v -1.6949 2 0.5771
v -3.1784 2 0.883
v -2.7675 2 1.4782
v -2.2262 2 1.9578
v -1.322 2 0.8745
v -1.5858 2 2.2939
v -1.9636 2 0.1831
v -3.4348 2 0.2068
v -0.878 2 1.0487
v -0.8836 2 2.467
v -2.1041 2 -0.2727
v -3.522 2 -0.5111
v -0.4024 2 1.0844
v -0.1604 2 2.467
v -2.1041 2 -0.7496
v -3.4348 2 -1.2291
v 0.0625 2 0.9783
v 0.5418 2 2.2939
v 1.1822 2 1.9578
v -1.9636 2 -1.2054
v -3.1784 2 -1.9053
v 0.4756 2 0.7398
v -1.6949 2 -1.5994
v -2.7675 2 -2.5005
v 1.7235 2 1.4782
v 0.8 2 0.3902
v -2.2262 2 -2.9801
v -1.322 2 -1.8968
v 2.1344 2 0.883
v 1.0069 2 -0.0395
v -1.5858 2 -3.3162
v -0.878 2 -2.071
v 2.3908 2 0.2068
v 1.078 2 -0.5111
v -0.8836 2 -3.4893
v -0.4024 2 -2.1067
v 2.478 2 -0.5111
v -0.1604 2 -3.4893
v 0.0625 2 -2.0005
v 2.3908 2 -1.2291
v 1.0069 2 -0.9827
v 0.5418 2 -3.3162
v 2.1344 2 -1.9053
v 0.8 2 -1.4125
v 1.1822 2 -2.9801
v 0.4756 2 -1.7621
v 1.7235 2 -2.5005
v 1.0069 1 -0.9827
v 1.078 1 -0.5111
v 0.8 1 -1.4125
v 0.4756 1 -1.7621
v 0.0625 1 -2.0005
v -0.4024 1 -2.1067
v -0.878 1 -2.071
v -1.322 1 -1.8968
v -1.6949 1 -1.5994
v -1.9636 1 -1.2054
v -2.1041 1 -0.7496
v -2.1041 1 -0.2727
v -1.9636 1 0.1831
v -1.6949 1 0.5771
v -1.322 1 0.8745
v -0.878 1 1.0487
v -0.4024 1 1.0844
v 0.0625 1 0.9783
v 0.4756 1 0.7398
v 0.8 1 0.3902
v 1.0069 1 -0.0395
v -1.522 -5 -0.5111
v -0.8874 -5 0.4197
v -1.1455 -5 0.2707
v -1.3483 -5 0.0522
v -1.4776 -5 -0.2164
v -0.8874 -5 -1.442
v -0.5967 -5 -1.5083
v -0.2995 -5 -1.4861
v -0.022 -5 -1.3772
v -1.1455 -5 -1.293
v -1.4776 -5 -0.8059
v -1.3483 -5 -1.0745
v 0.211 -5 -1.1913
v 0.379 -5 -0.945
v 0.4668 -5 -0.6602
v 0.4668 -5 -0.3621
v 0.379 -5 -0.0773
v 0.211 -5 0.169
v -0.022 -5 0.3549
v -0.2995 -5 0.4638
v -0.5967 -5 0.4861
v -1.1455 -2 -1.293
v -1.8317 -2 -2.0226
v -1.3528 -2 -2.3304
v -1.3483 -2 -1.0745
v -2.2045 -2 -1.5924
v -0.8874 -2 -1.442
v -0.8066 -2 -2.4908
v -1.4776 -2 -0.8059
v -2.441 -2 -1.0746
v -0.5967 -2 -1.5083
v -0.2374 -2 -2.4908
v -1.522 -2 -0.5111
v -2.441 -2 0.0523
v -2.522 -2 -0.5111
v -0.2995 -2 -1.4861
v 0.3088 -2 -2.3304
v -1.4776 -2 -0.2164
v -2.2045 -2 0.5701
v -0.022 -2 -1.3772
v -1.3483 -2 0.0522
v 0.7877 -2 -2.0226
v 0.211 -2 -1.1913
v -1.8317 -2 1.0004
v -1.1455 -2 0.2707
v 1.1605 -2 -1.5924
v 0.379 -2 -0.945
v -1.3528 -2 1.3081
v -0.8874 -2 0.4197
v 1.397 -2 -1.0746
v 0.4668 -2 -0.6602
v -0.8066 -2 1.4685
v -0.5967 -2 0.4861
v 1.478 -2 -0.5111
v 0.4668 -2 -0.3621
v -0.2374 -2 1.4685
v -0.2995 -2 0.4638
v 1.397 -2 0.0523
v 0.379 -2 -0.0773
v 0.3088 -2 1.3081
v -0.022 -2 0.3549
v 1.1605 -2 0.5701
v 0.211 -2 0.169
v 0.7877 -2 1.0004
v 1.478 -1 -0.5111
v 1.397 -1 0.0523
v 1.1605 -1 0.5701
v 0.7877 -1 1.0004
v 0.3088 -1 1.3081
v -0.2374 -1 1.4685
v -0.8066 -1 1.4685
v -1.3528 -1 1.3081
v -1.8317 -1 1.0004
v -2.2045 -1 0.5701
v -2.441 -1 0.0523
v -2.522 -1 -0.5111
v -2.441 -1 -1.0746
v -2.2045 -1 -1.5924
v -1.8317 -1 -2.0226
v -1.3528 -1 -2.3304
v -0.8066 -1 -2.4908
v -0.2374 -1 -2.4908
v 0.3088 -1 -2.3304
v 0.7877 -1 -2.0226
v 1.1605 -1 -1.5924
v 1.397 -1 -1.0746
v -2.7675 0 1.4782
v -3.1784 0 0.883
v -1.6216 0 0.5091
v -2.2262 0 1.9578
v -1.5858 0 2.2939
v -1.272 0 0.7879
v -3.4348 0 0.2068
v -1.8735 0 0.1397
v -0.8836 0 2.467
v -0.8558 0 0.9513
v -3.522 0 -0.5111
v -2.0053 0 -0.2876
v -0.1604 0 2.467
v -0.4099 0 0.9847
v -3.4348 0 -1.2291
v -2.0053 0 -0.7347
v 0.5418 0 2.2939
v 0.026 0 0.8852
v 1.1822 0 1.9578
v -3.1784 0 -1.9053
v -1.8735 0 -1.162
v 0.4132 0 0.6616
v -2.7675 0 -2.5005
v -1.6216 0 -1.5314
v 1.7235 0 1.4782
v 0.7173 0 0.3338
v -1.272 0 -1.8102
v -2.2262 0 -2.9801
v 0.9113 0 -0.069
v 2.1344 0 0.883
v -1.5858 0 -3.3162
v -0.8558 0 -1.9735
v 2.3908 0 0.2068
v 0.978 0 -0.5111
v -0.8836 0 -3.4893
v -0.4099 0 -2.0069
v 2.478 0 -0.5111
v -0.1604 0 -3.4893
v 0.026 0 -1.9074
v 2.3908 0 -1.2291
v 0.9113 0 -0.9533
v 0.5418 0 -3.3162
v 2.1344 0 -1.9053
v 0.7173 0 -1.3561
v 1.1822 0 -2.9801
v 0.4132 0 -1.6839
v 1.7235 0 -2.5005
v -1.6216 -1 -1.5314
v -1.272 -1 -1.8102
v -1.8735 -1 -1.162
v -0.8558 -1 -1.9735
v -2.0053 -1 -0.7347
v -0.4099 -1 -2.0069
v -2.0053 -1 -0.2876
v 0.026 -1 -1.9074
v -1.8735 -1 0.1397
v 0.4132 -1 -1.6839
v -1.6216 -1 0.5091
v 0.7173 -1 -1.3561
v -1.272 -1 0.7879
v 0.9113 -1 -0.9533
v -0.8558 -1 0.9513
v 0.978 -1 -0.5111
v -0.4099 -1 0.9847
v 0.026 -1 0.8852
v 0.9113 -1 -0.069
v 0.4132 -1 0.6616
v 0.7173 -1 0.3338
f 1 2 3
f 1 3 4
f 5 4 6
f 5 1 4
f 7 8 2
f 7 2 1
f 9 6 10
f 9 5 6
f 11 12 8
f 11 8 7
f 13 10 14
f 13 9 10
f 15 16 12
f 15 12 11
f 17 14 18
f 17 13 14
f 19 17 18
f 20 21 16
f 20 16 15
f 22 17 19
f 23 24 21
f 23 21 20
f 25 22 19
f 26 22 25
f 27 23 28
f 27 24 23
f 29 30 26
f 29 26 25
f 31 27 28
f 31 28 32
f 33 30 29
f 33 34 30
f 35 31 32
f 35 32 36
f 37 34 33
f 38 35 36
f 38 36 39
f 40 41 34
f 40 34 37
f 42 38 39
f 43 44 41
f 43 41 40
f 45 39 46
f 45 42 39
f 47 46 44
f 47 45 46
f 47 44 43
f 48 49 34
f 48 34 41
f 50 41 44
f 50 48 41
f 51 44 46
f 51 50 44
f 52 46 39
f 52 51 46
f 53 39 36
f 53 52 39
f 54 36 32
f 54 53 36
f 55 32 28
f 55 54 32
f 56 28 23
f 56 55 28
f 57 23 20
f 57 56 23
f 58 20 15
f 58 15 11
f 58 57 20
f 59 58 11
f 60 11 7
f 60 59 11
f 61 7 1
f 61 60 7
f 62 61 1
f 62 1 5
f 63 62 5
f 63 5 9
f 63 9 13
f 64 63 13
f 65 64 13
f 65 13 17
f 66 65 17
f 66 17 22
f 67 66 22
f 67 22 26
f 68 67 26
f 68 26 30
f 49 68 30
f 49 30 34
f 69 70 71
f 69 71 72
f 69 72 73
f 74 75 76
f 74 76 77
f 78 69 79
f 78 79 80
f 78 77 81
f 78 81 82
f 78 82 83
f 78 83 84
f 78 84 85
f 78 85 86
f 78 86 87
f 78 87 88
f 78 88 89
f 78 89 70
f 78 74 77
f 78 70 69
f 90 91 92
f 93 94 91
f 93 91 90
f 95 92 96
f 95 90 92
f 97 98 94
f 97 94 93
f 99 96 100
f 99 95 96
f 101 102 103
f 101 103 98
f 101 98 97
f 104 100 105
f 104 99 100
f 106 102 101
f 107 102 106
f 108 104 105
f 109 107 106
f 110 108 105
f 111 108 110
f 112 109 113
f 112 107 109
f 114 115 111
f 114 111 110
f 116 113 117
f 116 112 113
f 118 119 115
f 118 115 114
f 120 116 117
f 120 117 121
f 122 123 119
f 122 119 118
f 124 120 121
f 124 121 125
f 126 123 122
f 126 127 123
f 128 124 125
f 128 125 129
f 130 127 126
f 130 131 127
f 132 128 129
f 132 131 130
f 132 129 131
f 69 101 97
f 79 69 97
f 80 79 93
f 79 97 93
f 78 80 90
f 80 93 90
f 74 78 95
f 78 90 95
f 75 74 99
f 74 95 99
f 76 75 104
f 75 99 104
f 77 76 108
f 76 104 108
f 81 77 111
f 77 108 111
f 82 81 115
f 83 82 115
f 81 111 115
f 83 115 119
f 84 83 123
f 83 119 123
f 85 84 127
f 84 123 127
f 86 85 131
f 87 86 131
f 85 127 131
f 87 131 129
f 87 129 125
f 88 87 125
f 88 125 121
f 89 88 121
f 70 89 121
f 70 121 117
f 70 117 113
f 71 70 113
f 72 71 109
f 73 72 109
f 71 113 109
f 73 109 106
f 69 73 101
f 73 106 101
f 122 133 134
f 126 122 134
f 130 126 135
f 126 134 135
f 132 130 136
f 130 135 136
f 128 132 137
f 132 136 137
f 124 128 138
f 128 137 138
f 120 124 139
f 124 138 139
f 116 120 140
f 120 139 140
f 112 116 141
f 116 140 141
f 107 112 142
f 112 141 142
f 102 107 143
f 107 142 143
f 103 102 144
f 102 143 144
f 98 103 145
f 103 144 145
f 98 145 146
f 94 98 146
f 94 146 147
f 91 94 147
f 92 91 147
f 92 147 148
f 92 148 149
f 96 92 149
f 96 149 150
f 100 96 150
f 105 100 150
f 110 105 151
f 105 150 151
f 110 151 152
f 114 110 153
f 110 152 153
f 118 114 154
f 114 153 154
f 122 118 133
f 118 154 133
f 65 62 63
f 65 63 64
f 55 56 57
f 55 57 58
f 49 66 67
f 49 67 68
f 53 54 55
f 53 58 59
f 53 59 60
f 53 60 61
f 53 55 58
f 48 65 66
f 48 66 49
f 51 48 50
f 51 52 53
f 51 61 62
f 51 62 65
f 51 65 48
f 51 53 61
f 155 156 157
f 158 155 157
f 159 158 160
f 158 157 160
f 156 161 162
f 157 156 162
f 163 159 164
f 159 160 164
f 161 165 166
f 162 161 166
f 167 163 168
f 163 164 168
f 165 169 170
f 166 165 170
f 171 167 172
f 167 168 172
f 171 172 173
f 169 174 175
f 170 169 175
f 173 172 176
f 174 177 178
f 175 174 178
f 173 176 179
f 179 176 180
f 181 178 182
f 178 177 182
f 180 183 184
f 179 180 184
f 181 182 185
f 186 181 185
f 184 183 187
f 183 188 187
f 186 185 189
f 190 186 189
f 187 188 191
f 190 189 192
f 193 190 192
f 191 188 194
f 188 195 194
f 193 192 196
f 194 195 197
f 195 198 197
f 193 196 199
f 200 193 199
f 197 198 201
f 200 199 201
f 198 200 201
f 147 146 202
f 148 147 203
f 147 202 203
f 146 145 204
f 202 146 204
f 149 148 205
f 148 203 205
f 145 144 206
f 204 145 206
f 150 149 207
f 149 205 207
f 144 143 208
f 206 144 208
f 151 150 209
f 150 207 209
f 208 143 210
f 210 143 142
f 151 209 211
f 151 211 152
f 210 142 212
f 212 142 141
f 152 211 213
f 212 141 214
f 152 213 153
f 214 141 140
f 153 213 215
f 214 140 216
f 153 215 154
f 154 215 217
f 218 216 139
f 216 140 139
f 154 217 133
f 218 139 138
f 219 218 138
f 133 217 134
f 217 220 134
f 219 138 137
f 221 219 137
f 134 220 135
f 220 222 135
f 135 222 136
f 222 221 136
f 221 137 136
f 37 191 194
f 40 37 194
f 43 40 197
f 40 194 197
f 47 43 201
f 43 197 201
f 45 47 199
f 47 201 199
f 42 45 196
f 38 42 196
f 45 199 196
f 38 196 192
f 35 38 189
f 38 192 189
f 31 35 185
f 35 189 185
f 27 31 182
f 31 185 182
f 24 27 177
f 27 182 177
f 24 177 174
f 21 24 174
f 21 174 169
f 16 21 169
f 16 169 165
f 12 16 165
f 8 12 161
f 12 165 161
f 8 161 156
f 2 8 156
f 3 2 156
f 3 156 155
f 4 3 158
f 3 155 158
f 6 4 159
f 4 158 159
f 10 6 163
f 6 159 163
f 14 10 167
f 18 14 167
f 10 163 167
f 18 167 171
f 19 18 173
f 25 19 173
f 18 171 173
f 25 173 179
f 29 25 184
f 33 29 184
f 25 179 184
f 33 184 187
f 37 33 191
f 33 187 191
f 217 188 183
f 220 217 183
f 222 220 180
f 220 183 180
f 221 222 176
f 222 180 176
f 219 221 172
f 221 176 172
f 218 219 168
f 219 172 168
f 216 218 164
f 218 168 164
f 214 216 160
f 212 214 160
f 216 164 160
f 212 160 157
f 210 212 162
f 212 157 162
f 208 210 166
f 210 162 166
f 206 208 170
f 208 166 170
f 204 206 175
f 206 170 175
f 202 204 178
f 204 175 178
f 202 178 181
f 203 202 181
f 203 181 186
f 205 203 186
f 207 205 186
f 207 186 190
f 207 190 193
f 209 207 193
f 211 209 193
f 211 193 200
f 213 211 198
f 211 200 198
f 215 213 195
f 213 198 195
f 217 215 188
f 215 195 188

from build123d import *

# Parameters (mm, degrees)
SKETCH1_R           = 3
SKETCH1_R_2         = 1.6
BOSS_EXTRUDE1_DEPTH = 2
SKETCH1_3_R         = 1.6
BOSS_EXTRUDE2_DEPTH = 1
SKETCH5_R           = 1.5
BOSS_EXTRUDE3_DEPTH = 1
SKETCH6_R           = 2
BOSS_EXTRUDE4_DEPTH = 1
SKETCH8_R           = 1
BOSS_EXTRUDE5_DEPTH = 3


with BuildPart() as part:
    # Sketch1 → Boss-Extrude1 (new body)
    with BuildSketch(Plane(origin=(0, 0, 0), x_dir=(1, 0, 0), z_dir=(0, 1, 0))):
        with Locations((-0.522013312, 0.511138034)):
            Circle(SKETCH1_R)
        with Locations((-0.522013312, 0.511138034)):
            Circle(SKETCH1_R_2, mode=Mode.SUBTRACT)
    extrude(amount=BOSS_EXTRUDE1_DEPTH)

    # Sketch1<3> → Boss-Extrude2 (add)
    with BuildSketch(Plane(origin=(0, 0, 0), x_dir=(1, 0, 0), z_dir=(0, 1, 0))):
        with Locations((-0.522013312, 0.511138034)):
            Circle(SKETCH1_3_R)
    extrude(amount=BOSS_EXTRUDE2_DEPTH)

    # Sketch5 → Boss-Extrude3 (add)
    with BuildSketch(Plane.XZ):
        with Locations((-0.522013312, -0.511138034)):
            Circle(SKETCH5_R)
    extrude(amount=BOSS_EXTRUDE3_DEPTH)

    # Sketch6 → Boss-Extrude4 (add)
    with BuildSketch(Plane.XZ.offset(1)):
        with Locations((-0.522013312, -0.511138034)):
            Circle(SKETCH6_R)
    extrude(amount=BOSS_EXTRUDE4_DEPTH)

    # Sketch8 → Boss-Extrude5 (add)
    with BuildSketch(Plane(origin=(0, -2, 0), x_dir=(-1, 0, 0), z_dir=(0, -1, 0))):
        with Locations((0.522013312, 0.511138034)):
            Circle(SKETCH8_R)
    extrude(amount=BOSS_EXTRUDE5_DEPTH)


solid = part.part
